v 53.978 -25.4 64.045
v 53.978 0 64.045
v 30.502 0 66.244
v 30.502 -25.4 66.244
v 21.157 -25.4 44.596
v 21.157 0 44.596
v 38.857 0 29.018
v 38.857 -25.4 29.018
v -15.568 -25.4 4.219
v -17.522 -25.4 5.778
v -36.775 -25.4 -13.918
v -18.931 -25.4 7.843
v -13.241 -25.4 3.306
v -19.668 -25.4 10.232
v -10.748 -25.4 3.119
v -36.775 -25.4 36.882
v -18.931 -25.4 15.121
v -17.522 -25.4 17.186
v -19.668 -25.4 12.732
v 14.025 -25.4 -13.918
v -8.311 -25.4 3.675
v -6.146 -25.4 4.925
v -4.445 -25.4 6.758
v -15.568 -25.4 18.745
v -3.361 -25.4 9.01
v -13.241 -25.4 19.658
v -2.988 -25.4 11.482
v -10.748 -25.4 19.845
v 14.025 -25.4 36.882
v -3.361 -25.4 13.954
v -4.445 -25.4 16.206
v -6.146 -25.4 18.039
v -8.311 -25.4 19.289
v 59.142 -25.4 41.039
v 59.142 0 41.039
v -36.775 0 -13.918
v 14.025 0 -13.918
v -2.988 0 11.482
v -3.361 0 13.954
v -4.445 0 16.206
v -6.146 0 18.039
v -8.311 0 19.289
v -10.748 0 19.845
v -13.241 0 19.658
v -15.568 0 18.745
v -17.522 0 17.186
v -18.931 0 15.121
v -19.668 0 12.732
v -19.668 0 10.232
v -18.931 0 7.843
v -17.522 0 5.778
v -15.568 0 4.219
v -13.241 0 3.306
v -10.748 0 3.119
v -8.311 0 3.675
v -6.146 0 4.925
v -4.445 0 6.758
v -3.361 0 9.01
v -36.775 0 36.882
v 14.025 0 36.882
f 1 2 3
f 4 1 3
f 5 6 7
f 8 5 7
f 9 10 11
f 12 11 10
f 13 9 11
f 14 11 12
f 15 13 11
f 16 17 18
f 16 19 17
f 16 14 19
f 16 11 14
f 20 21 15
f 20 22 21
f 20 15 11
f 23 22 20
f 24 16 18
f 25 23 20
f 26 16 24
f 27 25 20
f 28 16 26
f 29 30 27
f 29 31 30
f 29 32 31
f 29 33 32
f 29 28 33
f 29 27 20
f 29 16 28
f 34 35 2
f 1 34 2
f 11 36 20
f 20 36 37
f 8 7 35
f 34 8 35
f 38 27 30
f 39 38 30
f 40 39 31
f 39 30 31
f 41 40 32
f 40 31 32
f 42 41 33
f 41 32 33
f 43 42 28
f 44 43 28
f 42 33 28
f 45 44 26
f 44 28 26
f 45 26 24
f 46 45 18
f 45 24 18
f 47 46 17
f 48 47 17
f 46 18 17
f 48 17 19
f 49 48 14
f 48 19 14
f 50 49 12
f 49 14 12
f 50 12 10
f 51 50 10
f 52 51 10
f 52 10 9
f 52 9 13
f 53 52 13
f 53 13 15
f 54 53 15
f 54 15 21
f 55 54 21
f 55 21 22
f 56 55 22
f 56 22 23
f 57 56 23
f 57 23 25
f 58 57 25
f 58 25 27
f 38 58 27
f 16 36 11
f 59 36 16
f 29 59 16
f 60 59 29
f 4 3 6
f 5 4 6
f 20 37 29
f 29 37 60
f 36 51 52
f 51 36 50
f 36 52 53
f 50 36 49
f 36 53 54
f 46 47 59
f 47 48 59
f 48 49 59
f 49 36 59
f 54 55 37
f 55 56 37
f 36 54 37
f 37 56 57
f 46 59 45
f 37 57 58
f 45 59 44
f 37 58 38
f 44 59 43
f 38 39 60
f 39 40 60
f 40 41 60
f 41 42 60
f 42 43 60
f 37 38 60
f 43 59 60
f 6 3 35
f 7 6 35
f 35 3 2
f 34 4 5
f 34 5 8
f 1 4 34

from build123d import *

# Parameters (mm, degrees)
F0_W     = 50.8
F0_H     = 50.8
F1_DEPTH = 25.4
F2_R     = 8.386612
F3_DEPTH = 25.401
F5_DEPTH = 25.4


with BuildPart() as f1:
    # F0 (on Front) → F1 (new body)
    with BuildSketch(Plane.XZ):
        with Locations((-11.374604, 11.482147)):
            Rectangle(F0_W, F0_H)
    extrude(amount=F1_DEPTH)

    # F2 (on face) → F3 (cut, through all)
    with BuildSketch(Plane.XZ.offset(25.4)):
        with Locations((-11.374604, 11.482147)):
            Circle(F2_R)
    extrude(amount=-F3_DEPTH, mode=Mode.SUBTRACT)


with BuildPart() as f5:
    # F4 (on Front) → F5 (new body)
    with BuildSketch(Plane.XZ):
        Polygon((38.85713, 29.018331), (59.141824, 41.038889), (53.97791, 64.045336), (30.501741, 66.243545), (21.156585, 44.595665), align=None)
    extrude(amount=F5_DEPTH)


solid = Compound([f1.part, f5.part])
